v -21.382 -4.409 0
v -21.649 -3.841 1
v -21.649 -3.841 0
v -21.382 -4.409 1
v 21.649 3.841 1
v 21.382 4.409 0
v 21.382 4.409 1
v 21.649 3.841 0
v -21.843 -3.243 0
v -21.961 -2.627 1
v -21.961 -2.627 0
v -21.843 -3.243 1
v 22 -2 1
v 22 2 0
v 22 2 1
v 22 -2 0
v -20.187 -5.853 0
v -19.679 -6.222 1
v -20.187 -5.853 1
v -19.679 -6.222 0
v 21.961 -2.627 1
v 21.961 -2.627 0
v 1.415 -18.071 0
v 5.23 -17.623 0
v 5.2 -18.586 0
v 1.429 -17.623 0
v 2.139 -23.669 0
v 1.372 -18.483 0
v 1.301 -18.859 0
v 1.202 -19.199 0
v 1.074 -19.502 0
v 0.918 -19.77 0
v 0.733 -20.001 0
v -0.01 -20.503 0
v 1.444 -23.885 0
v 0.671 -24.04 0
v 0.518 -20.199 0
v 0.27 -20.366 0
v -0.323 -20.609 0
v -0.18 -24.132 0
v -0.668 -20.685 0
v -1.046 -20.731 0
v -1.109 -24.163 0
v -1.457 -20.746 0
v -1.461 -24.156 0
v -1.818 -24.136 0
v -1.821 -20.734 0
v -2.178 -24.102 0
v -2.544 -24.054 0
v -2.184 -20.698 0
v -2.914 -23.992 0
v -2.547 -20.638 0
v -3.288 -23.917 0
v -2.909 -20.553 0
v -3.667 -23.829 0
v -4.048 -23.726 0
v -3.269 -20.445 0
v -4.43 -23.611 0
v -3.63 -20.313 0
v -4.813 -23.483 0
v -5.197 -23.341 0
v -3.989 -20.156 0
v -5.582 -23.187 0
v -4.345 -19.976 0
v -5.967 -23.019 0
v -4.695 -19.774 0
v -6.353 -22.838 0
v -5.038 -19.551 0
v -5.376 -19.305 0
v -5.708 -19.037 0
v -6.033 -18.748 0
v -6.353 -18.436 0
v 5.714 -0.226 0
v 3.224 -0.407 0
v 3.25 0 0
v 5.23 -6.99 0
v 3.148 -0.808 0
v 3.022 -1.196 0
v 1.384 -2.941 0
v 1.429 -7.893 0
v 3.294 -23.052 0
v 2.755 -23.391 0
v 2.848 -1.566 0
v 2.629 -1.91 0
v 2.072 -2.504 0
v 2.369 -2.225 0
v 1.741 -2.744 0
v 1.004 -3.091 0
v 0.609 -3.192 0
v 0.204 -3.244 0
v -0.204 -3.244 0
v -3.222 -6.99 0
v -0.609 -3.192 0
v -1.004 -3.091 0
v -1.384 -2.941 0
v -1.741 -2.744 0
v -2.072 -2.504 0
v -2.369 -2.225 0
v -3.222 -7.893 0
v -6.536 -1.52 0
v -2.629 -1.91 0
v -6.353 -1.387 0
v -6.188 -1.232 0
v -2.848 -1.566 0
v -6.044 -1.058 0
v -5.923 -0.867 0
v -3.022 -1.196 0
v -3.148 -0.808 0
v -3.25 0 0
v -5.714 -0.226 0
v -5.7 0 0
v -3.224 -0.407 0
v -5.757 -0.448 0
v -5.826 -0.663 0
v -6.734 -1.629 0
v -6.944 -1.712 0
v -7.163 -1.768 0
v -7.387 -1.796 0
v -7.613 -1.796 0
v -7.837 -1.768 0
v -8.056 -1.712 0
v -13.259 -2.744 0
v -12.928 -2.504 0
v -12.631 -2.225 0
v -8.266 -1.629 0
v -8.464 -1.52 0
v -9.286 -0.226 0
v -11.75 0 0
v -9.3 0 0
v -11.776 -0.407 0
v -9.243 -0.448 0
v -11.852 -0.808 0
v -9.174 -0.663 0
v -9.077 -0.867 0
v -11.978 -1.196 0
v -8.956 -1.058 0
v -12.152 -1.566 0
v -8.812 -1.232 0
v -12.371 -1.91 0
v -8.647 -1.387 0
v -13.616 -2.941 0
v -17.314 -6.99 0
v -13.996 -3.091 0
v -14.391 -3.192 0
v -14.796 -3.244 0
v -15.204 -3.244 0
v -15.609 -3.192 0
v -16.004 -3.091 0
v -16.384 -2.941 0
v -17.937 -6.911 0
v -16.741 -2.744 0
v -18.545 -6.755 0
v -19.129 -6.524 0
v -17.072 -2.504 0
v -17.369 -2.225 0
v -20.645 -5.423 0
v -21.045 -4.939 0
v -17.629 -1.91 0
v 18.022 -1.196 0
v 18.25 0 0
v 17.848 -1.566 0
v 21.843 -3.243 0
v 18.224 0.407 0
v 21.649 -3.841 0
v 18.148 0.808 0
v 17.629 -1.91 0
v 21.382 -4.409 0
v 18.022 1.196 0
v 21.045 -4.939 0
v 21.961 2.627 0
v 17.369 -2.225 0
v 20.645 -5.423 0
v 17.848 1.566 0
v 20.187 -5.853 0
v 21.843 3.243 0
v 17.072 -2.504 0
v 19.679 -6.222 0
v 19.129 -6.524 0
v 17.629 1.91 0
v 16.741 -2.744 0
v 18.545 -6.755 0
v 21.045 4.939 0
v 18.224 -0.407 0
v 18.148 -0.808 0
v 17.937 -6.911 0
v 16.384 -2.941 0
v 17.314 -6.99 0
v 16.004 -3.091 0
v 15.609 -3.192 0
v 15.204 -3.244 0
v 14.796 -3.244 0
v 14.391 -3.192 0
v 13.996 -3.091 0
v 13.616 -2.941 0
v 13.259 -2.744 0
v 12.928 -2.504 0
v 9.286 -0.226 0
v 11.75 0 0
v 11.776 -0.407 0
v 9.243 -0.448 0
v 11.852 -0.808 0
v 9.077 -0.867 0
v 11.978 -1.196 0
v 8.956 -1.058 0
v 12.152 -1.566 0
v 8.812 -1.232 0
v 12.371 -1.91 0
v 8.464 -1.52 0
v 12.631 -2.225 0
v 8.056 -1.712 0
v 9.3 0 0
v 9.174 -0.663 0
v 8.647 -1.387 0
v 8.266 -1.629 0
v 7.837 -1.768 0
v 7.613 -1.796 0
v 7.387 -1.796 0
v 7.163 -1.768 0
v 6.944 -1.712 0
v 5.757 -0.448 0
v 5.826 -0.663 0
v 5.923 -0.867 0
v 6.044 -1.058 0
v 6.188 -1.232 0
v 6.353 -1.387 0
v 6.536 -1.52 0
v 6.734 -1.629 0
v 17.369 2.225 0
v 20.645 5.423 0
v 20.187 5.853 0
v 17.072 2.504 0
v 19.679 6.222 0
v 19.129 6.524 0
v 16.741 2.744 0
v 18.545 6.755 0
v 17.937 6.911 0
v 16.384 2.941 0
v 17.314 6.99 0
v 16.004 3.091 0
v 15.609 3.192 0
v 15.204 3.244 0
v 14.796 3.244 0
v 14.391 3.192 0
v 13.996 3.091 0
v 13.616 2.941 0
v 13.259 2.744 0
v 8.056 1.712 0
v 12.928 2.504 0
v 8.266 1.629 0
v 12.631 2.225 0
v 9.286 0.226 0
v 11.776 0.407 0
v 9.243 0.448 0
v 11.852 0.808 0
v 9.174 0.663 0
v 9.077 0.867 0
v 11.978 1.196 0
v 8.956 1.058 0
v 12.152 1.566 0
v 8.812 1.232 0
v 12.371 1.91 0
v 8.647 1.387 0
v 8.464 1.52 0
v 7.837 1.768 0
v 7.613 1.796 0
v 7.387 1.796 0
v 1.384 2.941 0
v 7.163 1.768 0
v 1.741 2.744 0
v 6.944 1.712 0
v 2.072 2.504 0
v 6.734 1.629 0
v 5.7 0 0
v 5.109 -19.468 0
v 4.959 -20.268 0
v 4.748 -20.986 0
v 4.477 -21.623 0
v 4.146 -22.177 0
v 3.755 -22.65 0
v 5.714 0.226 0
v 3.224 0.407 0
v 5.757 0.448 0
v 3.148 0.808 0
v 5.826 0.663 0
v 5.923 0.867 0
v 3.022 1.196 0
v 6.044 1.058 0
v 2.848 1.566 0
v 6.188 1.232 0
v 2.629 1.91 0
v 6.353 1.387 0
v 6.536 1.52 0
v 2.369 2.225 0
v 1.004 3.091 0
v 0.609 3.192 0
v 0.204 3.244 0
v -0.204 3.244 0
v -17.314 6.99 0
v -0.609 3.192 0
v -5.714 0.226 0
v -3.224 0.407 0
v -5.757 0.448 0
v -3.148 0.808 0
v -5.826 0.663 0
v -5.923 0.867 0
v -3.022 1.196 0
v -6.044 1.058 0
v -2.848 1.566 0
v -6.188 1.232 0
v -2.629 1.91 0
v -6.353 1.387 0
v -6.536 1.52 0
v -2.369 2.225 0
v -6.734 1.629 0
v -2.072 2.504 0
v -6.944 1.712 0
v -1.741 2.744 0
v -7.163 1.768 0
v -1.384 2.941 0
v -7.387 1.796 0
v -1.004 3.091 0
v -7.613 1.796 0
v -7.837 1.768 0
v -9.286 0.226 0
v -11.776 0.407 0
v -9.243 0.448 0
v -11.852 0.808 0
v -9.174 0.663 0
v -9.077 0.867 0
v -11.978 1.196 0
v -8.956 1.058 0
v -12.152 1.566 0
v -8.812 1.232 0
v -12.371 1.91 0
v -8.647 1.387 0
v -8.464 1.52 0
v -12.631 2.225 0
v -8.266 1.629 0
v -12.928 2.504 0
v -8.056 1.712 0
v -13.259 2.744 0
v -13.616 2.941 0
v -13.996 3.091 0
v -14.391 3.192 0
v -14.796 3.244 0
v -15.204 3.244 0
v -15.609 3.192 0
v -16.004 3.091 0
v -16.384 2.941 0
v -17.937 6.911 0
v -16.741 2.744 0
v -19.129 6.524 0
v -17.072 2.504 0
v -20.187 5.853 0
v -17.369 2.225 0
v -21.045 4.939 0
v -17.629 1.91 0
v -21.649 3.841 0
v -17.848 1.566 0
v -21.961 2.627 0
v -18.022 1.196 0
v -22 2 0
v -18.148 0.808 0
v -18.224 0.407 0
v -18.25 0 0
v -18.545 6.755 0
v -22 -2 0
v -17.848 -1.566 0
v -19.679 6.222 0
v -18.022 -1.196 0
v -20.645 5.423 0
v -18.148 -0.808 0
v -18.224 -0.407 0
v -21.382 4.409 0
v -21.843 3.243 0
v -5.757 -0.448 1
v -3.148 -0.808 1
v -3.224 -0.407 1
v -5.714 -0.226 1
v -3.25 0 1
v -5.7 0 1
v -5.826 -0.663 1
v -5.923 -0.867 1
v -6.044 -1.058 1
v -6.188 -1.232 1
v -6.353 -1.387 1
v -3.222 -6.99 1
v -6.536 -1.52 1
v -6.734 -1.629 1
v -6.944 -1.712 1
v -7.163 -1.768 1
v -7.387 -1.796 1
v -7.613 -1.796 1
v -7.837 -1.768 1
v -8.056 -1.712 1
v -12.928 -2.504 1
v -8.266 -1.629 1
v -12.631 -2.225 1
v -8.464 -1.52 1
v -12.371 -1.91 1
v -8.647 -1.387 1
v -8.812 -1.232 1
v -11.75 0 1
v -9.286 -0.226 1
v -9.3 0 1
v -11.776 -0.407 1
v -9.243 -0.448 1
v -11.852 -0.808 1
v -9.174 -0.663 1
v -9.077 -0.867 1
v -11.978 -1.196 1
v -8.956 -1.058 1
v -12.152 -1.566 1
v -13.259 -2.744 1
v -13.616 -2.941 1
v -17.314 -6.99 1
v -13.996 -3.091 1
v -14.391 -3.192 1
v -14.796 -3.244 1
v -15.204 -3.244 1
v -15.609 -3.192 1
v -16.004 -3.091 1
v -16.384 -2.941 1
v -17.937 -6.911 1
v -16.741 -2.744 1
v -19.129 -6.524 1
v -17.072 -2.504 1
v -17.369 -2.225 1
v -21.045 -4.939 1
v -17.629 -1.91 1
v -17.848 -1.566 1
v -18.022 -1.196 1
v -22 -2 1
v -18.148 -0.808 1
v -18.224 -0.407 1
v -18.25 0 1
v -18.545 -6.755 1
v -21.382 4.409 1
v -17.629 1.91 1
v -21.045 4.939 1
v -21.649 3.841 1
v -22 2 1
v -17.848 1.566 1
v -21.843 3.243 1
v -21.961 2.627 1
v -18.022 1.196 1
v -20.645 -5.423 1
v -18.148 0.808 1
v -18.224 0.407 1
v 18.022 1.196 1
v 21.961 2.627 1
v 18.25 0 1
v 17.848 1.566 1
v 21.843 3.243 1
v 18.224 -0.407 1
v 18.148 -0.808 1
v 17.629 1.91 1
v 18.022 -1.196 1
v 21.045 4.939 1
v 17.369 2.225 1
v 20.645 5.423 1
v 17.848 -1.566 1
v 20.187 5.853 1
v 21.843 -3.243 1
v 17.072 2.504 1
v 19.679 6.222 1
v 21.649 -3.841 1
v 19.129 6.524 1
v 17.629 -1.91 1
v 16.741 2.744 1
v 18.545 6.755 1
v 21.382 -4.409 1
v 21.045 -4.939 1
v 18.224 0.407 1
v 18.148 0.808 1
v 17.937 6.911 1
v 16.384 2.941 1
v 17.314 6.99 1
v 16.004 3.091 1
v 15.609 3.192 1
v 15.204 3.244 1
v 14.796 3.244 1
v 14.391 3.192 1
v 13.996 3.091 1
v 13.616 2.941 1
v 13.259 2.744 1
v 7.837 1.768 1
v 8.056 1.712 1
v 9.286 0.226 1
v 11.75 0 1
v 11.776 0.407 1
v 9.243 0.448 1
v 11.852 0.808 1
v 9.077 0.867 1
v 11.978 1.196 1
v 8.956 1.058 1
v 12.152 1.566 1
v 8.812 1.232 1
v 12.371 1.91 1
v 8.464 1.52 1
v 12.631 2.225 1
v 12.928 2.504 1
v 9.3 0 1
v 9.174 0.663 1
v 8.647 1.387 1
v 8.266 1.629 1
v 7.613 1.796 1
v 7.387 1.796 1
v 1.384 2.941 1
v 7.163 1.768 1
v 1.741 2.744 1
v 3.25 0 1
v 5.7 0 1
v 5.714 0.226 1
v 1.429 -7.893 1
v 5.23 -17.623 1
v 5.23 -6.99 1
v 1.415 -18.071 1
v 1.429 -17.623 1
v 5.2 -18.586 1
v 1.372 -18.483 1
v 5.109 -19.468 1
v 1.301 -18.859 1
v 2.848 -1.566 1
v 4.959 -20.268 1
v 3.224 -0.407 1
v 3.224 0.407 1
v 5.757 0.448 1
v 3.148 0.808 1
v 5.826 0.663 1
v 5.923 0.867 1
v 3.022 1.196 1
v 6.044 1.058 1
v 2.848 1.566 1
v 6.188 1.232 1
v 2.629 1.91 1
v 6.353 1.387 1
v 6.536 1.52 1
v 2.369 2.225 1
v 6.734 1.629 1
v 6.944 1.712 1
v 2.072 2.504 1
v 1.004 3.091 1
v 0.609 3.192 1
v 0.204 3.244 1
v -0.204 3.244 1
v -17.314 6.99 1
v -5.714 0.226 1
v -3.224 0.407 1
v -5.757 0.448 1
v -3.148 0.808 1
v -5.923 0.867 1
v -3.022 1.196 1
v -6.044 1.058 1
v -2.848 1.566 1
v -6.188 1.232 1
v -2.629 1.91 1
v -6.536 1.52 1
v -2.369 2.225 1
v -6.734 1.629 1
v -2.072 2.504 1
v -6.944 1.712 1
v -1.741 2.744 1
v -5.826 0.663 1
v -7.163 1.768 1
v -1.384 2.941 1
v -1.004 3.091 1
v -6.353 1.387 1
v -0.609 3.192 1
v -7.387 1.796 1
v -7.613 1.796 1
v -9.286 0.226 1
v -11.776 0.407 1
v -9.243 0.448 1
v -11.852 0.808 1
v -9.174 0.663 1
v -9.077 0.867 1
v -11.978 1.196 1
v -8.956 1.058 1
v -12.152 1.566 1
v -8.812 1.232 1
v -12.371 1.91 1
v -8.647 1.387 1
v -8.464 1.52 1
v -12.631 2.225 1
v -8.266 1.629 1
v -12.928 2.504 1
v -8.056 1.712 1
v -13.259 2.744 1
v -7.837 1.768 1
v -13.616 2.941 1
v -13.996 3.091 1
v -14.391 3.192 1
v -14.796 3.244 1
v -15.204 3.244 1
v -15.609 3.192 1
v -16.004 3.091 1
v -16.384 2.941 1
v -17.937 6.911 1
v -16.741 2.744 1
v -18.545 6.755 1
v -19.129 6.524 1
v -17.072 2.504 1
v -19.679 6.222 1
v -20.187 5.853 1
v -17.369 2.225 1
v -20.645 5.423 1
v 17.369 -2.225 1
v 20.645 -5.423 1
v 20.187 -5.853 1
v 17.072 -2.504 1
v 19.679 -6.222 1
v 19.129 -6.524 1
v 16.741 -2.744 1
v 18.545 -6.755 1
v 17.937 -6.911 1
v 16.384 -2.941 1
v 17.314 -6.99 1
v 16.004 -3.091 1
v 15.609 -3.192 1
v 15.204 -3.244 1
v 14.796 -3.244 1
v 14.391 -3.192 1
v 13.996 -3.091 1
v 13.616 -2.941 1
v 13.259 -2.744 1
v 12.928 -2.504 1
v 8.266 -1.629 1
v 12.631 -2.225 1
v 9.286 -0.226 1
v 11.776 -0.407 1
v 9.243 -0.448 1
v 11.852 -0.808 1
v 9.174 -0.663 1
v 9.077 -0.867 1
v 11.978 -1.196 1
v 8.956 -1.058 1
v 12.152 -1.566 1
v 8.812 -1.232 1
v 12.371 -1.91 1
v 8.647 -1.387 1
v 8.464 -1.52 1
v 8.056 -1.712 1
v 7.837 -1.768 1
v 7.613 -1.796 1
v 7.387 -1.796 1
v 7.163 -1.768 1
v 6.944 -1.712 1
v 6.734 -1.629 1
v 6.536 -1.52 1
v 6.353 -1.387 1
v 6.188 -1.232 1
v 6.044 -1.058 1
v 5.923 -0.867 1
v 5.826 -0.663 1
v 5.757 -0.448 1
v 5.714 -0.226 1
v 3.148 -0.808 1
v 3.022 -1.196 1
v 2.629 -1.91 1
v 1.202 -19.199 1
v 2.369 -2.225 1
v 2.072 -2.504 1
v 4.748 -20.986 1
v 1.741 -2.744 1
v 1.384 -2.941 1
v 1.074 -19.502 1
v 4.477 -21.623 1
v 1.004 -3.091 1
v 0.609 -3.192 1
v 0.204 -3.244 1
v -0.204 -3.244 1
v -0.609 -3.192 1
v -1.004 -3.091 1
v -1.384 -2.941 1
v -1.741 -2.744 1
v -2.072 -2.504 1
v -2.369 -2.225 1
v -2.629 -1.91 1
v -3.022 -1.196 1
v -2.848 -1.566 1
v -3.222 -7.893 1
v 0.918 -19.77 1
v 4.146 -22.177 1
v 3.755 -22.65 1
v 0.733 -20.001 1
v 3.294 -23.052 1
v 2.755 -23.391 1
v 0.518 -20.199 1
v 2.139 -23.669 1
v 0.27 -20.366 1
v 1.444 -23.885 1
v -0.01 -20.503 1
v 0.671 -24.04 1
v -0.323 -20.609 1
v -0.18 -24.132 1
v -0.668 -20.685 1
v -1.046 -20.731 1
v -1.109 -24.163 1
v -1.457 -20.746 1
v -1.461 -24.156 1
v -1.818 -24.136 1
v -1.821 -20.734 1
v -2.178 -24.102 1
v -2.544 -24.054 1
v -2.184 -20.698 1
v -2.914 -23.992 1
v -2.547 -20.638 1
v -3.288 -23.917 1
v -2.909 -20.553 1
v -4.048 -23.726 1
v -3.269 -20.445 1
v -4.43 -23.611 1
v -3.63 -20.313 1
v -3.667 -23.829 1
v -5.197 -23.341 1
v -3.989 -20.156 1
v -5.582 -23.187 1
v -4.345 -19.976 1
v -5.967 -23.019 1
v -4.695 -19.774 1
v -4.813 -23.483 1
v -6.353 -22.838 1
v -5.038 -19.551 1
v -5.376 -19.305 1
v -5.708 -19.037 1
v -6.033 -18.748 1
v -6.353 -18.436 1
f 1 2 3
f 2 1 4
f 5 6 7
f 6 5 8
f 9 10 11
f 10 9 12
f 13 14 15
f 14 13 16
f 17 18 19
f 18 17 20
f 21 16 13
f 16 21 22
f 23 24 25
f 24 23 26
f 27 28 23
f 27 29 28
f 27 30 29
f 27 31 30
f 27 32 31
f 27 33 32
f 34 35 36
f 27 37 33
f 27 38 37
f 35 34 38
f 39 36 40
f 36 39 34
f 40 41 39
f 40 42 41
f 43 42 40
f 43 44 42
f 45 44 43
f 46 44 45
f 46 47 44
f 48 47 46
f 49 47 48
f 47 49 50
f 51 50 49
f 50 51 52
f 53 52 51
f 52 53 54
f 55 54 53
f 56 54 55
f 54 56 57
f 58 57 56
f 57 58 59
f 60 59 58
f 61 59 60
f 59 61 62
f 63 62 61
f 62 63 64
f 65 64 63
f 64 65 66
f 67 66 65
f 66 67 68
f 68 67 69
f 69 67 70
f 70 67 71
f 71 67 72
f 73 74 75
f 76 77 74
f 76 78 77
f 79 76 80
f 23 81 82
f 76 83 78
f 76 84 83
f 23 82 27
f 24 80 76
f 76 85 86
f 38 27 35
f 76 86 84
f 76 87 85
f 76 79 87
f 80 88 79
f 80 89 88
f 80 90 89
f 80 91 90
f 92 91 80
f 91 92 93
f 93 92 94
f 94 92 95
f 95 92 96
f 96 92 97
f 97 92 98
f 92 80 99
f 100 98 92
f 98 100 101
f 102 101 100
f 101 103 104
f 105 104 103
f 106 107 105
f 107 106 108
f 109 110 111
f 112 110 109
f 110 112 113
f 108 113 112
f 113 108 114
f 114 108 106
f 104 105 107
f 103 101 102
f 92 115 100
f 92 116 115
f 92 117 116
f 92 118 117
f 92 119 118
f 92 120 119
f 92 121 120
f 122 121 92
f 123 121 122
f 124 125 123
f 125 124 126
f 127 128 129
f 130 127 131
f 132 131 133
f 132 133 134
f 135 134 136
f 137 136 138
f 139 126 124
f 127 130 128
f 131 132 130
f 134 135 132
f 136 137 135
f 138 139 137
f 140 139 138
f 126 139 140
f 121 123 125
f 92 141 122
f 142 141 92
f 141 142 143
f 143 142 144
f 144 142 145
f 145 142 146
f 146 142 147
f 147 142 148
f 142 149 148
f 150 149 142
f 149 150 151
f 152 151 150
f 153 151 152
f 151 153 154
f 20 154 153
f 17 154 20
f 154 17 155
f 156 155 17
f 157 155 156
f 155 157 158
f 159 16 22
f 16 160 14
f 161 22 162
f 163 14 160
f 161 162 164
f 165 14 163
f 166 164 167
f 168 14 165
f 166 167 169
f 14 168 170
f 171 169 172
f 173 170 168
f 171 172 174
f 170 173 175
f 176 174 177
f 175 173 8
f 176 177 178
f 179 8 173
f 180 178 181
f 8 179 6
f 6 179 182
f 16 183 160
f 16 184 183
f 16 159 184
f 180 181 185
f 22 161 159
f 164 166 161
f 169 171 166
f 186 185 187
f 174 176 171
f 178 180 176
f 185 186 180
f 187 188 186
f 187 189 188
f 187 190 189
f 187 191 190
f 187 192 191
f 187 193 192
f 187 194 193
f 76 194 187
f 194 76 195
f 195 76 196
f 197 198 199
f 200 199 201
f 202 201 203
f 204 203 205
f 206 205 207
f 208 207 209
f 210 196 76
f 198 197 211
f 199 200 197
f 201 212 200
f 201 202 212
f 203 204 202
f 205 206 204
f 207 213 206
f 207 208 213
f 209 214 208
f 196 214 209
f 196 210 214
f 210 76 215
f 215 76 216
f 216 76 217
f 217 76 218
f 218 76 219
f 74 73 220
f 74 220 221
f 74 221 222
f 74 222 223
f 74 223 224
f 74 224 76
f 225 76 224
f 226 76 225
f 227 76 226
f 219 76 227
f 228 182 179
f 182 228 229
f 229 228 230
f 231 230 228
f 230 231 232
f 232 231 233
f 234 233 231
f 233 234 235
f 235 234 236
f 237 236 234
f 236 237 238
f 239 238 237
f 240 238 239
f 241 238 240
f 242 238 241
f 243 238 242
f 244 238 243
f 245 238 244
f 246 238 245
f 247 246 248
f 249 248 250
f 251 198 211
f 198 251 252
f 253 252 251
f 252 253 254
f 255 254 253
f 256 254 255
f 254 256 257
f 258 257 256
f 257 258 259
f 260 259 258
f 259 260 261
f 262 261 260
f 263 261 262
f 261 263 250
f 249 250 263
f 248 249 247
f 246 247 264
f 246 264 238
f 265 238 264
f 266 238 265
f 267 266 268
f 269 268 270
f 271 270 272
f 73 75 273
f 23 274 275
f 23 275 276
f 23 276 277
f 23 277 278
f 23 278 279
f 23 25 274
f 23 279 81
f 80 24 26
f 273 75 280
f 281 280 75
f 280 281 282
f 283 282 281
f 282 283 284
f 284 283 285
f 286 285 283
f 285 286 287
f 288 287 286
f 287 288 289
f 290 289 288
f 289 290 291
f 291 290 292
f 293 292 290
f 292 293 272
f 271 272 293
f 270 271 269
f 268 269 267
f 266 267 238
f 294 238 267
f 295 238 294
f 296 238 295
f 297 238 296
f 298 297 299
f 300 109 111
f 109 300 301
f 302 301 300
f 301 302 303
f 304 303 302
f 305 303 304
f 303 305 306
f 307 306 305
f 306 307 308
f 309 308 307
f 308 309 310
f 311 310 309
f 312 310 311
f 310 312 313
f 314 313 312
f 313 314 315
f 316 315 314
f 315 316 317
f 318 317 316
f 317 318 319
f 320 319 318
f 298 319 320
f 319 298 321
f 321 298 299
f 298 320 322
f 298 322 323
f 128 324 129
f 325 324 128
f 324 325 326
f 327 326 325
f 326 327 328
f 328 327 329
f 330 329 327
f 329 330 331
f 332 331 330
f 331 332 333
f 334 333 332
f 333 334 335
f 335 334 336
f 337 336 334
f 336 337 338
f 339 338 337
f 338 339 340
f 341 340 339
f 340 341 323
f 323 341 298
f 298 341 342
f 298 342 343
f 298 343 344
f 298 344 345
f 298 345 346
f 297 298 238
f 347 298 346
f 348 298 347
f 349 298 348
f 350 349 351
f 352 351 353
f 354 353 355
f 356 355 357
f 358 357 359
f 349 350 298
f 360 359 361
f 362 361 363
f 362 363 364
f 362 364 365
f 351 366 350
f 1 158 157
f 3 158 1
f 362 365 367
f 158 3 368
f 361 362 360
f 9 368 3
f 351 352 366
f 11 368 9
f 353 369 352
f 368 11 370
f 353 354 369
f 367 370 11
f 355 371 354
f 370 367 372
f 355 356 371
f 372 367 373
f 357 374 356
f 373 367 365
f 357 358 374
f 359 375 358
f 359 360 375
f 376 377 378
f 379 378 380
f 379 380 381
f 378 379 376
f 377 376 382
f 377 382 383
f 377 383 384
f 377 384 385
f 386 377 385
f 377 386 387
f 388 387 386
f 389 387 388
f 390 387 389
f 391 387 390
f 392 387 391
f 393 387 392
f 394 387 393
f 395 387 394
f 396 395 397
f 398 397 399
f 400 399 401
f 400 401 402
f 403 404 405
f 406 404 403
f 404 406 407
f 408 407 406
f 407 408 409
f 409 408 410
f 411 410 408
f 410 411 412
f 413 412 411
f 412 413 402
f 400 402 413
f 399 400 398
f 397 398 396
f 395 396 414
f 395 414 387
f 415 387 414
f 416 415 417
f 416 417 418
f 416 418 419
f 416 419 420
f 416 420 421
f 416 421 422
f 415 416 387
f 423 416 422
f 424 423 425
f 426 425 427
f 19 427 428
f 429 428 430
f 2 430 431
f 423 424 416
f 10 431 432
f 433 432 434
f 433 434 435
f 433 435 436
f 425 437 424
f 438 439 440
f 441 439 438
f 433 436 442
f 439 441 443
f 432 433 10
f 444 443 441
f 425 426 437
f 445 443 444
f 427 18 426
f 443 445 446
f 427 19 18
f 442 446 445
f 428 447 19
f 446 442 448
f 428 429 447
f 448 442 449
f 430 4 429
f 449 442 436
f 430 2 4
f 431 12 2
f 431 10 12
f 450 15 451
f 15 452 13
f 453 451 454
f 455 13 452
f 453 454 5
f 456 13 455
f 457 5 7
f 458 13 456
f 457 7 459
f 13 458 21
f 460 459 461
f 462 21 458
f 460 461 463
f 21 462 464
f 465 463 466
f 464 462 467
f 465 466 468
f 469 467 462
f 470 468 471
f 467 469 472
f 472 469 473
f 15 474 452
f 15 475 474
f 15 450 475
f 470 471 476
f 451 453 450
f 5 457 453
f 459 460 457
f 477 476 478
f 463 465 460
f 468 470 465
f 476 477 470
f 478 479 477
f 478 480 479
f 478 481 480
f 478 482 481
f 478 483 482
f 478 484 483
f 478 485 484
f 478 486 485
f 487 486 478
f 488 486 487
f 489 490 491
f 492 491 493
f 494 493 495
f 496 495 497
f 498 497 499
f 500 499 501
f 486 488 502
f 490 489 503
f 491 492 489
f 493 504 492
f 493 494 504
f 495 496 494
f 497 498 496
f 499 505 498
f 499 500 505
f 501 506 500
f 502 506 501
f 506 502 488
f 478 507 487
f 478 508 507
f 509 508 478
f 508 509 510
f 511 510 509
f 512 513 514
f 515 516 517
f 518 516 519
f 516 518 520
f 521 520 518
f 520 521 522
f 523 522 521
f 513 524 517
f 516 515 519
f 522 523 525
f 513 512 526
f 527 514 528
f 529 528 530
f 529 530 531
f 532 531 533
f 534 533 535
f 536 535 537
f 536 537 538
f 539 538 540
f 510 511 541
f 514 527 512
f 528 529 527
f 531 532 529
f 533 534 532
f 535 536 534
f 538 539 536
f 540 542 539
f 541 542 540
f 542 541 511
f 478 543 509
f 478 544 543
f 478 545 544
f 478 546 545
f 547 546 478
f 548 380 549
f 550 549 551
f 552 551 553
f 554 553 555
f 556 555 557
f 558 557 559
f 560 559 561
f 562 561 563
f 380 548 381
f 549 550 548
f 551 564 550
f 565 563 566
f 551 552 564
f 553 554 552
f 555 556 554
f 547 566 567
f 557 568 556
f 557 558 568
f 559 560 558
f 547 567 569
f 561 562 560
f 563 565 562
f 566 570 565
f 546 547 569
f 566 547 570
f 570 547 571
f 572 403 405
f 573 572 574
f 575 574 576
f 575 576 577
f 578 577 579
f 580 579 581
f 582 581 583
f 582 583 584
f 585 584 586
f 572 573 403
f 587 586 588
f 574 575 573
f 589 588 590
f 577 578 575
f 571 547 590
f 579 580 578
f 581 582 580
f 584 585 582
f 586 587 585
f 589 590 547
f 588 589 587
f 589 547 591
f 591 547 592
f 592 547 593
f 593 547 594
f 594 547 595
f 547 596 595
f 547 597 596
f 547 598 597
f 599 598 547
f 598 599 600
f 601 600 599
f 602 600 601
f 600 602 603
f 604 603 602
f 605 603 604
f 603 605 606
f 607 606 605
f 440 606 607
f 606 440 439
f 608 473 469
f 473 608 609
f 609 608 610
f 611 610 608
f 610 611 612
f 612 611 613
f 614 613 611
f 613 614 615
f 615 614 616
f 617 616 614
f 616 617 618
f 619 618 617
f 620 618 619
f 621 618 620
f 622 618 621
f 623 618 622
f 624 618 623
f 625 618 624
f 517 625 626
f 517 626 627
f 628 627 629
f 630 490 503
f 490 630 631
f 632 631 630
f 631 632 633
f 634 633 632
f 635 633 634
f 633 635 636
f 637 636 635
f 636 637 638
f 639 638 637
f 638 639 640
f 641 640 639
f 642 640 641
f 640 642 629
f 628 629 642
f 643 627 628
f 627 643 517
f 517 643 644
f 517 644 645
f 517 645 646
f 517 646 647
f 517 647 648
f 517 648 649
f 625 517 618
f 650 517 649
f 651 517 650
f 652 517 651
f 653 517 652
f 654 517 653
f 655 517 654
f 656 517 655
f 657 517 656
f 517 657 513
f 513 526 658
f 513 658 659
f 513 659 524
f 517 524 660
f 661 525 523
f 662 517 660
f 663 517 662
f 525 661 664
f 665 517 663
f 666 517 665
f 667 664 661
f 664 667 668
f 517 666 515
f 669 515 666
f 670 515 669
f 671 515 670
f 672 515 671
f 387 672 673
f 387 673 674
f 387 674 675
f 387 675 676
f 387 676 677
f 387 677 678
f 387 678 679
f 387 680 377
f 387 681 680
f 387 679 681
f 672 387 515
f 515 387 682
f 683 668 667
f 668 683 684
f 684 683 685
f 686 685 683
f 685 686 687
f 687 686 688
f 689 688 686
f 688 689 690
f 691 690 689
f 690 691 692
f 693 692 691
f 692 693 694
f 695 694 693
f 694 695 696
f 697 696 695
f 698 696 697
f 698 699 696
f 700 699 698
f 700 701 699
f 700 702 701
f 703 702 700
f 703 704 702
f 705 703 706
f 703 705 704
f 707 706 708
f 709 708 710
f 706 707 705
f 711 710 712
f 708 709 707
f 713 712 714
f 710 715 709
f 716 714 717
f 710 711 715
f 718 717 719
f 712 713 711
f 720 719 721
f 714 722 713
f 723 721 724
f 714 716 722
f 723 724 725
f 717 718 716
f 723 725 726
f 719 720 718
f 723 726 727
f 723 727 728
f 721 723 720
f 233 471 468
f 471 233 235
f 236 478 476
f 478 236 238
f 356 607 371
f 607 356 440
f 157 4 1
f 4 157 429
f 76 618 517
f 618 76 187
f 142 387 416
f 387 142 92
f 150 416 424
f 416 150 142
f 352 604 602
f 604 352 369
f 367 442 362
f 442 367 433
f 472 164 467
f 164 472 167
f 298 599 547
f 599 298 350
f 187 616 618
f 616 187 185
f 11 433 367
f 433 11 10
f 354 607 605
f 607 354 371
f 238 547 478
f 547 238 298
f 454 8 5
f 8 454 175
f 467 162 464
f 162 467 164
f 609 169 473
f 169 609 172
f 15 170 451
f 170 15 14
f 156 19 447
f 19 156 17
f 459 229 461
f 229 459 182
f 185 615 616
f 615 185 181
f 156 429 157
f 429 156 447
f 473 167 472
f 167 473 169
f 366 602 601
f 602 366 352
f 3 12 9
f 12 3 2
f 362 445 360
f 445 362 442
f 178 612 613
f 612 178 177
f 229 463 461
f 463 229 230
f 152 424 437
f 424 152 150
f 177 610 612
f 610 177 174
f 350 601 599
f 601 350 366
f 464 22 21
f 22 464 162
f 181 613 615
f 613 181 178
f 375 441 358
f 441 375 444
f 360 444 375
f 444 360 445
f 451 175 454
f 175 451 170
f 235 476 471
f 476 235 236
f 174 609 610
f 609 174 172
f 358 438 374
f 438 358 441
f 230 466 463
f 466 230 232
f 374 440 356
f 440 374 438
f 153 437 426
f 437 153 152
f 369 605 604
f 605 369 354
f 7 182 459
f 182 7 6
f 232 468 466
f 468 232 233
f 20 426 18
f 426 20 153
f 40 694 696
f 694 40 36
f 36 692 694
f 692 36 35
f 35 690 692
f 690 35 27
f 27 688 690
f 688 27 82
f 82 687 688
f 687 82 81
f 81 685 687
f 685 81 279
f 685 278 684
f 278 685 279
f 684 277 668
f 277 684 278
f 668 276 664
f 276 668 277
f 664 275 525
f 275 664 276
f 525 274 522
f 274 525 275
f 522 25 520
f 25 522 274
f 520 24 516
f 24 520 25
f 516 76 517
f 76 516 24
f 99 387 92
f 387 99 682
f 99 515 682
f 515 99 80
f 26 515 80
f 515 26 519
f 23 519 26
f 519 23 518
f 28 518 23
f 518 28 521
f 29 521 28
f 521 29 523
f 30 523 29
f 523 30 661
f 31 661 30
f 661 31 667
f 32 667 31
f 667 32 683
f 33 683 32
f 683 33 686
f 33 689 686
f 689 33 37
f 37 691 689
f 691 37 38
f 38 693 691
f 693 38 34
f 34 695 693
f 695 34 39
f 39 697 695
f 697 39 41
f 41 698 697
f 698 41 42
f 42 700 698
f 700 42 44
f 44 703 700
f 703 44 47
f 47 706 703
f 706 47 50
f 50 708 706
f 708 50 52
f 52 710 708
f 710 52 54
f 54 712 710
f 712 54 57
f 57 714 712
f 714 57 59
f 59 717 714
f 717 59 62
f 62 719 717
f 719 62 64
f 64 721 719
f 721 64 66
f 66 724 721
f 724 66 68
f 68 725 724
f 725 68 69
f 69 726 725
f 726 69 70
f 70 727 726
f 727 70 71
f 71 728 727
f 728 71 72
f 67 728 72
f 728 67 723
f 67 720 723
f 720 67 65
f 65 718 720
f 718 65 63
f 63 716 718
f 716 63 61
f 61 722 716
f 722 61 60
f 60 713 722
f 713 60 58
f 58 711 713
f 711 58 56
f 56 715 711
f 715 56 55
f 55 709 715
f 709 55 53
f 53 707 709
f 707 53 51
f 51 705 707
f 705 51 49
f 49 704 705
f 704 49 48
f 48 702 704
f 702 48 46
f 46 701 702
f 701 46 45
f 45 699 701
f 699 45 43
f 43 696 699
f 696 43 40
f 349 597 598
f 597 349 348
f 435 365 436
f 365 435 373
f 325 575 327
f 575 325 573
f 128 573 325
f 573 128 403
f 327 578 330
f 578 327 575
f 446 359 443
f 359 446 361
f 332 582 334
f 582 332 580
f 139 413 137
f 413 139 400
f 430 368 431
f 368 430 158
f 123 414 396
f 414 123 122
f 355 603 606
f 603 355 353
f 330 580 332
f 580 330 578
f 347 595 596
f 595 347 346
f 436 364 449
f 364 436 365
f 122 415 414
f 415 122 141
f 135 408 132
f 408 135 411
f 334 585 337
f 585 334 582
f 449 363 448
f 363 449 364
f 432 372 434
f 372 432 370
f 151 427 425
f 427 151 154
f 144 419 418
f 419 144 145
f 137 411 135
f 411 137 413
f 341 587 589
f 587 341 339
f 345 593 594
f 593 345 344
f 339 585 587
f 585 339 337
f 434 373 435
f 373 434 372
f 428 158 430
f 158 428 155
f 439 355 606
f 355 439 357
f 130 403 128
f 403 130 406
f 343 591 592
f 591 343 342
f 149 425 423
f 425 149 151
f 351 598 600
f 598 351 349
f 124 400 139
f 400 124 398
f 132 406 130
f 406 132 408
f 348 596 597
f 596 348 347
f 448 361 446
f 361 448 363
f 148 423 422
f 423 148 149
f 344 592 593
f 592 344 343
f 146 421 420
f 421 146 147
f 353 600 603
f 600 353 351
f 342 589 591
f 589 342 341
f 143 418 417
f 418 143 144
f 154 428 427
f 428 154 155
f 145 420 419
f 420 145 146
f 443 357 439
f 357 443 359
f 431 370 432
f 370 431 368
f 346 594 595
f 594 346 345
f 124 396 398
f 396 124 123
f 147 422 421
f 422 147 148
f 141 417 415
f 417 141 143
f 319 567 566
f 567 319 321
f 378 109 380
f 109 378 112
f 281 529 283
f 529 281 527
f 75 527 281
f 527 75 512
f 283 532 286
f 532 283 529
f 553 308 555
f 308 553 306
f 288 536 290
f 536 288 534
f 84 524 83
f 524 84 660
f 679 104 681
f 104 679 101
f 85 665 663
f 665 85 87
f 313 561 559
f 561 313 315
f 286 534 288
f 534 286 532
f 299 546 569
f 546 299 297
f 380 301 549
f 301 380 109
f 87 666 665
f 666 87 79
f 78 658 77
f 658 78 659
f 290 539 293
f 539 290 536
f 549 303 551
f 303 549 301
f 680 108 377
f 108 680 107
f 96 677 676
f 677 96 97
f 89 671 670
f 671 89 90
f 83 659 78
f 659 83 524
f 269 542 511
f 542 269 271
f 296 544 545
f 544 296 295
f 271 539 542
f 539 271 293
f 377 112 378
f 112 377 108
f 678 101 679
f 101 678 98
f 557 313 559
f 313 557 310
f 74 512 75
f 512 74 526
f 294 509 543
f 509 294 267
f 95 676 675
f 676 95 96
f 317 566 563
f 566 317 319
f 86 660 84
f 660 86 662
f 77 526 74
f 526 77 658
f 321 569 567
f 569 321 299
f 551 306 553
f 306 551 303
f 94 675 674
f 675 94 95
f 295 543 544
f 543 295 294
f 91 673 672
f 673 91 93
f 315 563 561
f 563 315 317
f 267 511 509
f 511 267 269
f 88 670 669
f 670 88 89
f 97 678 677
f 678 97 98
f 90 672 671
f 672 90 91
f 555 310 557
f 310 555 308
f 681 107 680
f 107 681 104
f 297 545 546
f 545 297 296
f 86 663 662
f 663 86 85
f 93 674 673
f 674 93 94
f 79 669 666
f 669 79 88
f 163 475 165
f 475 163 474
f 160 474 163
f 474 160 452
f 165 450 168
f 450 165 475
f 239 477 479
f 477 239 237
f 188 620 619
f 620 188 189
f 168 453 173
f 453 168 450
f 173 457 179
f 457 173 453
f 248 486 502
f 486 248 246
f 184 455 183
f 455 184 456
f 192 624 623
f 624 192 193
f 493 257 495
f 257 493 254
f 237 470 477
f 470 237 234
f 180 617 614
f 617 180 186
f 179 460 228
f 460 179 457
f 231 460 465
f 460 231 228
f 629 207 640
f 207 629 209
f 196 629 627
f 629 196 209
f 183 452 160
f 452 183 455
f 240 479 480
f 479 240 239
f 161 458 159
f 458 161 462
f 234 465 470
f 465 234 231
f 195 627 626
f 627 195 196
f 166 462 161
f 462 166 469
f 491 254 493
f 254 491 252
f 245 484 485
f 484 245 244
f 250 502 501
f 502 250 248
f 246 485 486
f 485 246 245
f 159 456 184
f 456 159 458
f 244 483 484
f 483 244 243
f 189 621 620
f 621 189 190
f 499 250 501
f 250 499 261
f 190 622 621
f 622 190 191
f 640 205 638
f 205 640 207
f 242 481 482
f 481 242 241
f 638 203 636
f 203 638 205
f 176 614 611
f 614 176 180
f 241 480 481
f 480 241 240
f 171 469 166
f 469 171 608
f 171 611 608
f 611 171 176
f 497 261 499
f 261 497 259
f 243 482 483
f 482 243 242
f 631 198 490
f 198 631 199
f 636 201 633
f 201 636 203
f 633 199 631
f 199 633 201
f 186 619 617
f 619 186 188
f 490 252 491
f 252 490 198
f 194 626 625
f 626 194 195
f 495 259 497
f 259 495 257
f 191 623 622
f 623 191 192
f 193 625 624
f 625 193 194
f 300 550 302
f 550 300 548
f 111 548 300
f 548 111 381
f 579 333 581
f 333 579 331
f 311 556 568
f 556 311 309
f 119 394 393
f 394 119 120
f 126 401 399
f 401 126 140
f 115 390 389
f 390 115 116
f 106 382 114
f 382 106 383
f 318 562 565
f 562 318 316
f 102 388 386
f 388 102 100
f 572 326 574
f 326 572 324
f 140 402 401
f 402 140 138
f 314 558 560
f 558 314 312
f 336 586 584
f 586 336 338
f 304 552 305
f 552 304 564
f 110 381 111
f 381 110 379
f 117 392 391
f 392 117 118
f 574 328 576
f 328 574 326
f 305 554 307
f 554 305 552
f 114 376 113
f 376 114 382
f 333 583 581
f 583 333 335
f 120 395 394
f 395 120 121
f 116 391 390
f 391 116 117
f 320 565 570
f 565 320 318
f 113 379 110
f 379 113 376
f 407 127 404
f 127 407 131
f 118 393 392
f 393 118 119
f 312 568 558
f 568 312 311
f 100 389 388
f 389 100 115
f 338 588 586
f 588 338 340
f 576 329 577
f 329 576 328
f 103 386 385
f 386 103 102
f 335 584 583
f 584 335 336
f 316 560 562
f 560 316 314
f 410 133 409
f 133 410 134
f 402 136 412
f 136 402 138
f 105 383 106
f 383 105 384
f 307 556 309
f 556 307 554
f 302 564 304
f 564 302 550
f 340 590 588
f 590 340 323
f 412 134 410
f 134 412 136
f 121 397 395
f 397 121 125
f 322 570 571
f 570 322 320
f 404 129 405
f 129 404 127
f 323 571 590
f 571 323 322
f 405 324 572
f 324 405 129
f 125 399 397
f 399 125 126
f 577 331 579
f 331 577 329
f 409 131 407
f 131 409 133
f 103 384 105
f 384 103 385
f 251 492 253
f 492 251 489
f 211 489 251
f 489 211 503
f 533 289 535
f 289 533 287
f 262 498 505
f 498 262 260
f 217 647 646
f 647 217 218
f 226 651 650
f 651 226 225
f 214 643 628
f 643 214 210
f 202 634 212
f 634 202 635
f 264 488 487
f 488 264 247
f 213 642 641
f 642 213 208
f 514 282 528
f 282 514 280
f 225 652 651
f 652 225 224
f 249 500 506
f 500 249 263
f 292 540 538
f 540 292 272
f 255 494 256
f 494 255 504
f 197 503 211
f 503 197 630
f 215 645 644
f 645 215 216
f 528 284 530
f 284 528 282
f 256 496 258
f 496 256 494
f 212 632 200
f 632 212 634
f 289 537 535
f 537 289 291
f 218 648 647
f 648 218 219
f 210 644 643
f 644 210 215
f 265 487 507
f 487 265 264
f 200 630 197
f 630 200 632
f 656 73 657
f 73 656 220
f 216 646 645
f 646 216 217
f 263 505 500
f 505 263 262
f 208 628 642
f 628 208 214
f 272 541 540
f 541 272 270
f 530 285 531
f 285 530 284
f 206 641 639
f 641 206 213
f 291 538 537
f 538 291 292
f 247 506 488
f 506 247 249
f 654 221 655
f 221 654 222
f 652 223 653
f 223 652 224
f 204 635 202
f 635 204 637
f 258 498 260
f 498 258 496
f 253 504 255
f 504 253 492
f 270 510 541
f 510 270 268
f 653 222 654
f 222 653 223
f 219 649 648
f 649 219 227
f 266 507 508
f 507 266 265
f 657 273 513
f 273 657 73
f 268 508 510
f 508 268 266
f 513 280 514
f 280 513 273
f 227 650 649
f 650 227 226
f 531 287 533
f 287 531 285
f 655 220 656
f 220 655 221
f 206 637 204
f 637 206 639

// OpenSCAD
$fn = 50;


difference() {
	union() {
		hull() {
			translate(v = [-17.0000000000, 2.0000000000, 0]) {
				cylinder(h = 1, r = 5);
			}
			translate(v = [17.0000000000, 2.0000000000, 0]) {
				cylinder(h = 1, r = 5);
			}
			translate(v = [-17.0000000000, -2.0000000000, 0]) {
				cylinder(h = 1, r = 5);
			}
			translate(v = [17.0000000000, -2.0000000000, 0]) {
				cylinder(h = 1, r = 5);
			}
		}
		translate(v = [0, -5, 0]) {
			linear_extrude(height = 1) {
				text(font = "DejaVu Sans Mono:style=Bold", halign = "center", size = 19.0000000000, text = "J", valign = "top");
			}
		}
	}
	union() {
		translate(v = [-15.0000000000, 0.0000000000, 0]) {
			translate(v = [0, 0, -100]) {
				cylinder(h = 200, r = 3.2500000000);
			}
		}
		translate(v = [0, 0, -100]) {
			cylinder(h = 200, r = 3.2500000000);
		}
		translate(v = [15.0000000000, 0.0000000000, 0]) {
			translate(v = [0, 0, -100]) {
				cylinder(h = 200, r = 3.2500000000);
			}
		}
		translate(v = [-15.0000000000, 0.0000000000, 0]) {
			translate(v = [0, 0, -100]) {
				cylinder(h = 200, r = 1.8000000000);
			}
		}
		translate(v = [-7.5000000000, 0.0000000000, 0]) {
			translate(v = [0, 0, -100]) {
				cylinder(h = 200, r = 1.8000000000);
			}
		}
		translate(v = [0, 0, -100]) {
			cylinder(h = 200, r = 1.8000000000);
		}
		translate(v = [7.5000000000, 0.0000000000, 0]) {
			translate(v = [0, 0, -100]) {
				cylinder(h = 200, r = 1.8000000000);
			}
		}
		translate(v = [15.0000000000, 0.0000000000, 0]) {
			translate(v = [0, 0, -100]) {
				cylinder(h = 200, r = 1.8000000000);
			}
		}
	}
}
